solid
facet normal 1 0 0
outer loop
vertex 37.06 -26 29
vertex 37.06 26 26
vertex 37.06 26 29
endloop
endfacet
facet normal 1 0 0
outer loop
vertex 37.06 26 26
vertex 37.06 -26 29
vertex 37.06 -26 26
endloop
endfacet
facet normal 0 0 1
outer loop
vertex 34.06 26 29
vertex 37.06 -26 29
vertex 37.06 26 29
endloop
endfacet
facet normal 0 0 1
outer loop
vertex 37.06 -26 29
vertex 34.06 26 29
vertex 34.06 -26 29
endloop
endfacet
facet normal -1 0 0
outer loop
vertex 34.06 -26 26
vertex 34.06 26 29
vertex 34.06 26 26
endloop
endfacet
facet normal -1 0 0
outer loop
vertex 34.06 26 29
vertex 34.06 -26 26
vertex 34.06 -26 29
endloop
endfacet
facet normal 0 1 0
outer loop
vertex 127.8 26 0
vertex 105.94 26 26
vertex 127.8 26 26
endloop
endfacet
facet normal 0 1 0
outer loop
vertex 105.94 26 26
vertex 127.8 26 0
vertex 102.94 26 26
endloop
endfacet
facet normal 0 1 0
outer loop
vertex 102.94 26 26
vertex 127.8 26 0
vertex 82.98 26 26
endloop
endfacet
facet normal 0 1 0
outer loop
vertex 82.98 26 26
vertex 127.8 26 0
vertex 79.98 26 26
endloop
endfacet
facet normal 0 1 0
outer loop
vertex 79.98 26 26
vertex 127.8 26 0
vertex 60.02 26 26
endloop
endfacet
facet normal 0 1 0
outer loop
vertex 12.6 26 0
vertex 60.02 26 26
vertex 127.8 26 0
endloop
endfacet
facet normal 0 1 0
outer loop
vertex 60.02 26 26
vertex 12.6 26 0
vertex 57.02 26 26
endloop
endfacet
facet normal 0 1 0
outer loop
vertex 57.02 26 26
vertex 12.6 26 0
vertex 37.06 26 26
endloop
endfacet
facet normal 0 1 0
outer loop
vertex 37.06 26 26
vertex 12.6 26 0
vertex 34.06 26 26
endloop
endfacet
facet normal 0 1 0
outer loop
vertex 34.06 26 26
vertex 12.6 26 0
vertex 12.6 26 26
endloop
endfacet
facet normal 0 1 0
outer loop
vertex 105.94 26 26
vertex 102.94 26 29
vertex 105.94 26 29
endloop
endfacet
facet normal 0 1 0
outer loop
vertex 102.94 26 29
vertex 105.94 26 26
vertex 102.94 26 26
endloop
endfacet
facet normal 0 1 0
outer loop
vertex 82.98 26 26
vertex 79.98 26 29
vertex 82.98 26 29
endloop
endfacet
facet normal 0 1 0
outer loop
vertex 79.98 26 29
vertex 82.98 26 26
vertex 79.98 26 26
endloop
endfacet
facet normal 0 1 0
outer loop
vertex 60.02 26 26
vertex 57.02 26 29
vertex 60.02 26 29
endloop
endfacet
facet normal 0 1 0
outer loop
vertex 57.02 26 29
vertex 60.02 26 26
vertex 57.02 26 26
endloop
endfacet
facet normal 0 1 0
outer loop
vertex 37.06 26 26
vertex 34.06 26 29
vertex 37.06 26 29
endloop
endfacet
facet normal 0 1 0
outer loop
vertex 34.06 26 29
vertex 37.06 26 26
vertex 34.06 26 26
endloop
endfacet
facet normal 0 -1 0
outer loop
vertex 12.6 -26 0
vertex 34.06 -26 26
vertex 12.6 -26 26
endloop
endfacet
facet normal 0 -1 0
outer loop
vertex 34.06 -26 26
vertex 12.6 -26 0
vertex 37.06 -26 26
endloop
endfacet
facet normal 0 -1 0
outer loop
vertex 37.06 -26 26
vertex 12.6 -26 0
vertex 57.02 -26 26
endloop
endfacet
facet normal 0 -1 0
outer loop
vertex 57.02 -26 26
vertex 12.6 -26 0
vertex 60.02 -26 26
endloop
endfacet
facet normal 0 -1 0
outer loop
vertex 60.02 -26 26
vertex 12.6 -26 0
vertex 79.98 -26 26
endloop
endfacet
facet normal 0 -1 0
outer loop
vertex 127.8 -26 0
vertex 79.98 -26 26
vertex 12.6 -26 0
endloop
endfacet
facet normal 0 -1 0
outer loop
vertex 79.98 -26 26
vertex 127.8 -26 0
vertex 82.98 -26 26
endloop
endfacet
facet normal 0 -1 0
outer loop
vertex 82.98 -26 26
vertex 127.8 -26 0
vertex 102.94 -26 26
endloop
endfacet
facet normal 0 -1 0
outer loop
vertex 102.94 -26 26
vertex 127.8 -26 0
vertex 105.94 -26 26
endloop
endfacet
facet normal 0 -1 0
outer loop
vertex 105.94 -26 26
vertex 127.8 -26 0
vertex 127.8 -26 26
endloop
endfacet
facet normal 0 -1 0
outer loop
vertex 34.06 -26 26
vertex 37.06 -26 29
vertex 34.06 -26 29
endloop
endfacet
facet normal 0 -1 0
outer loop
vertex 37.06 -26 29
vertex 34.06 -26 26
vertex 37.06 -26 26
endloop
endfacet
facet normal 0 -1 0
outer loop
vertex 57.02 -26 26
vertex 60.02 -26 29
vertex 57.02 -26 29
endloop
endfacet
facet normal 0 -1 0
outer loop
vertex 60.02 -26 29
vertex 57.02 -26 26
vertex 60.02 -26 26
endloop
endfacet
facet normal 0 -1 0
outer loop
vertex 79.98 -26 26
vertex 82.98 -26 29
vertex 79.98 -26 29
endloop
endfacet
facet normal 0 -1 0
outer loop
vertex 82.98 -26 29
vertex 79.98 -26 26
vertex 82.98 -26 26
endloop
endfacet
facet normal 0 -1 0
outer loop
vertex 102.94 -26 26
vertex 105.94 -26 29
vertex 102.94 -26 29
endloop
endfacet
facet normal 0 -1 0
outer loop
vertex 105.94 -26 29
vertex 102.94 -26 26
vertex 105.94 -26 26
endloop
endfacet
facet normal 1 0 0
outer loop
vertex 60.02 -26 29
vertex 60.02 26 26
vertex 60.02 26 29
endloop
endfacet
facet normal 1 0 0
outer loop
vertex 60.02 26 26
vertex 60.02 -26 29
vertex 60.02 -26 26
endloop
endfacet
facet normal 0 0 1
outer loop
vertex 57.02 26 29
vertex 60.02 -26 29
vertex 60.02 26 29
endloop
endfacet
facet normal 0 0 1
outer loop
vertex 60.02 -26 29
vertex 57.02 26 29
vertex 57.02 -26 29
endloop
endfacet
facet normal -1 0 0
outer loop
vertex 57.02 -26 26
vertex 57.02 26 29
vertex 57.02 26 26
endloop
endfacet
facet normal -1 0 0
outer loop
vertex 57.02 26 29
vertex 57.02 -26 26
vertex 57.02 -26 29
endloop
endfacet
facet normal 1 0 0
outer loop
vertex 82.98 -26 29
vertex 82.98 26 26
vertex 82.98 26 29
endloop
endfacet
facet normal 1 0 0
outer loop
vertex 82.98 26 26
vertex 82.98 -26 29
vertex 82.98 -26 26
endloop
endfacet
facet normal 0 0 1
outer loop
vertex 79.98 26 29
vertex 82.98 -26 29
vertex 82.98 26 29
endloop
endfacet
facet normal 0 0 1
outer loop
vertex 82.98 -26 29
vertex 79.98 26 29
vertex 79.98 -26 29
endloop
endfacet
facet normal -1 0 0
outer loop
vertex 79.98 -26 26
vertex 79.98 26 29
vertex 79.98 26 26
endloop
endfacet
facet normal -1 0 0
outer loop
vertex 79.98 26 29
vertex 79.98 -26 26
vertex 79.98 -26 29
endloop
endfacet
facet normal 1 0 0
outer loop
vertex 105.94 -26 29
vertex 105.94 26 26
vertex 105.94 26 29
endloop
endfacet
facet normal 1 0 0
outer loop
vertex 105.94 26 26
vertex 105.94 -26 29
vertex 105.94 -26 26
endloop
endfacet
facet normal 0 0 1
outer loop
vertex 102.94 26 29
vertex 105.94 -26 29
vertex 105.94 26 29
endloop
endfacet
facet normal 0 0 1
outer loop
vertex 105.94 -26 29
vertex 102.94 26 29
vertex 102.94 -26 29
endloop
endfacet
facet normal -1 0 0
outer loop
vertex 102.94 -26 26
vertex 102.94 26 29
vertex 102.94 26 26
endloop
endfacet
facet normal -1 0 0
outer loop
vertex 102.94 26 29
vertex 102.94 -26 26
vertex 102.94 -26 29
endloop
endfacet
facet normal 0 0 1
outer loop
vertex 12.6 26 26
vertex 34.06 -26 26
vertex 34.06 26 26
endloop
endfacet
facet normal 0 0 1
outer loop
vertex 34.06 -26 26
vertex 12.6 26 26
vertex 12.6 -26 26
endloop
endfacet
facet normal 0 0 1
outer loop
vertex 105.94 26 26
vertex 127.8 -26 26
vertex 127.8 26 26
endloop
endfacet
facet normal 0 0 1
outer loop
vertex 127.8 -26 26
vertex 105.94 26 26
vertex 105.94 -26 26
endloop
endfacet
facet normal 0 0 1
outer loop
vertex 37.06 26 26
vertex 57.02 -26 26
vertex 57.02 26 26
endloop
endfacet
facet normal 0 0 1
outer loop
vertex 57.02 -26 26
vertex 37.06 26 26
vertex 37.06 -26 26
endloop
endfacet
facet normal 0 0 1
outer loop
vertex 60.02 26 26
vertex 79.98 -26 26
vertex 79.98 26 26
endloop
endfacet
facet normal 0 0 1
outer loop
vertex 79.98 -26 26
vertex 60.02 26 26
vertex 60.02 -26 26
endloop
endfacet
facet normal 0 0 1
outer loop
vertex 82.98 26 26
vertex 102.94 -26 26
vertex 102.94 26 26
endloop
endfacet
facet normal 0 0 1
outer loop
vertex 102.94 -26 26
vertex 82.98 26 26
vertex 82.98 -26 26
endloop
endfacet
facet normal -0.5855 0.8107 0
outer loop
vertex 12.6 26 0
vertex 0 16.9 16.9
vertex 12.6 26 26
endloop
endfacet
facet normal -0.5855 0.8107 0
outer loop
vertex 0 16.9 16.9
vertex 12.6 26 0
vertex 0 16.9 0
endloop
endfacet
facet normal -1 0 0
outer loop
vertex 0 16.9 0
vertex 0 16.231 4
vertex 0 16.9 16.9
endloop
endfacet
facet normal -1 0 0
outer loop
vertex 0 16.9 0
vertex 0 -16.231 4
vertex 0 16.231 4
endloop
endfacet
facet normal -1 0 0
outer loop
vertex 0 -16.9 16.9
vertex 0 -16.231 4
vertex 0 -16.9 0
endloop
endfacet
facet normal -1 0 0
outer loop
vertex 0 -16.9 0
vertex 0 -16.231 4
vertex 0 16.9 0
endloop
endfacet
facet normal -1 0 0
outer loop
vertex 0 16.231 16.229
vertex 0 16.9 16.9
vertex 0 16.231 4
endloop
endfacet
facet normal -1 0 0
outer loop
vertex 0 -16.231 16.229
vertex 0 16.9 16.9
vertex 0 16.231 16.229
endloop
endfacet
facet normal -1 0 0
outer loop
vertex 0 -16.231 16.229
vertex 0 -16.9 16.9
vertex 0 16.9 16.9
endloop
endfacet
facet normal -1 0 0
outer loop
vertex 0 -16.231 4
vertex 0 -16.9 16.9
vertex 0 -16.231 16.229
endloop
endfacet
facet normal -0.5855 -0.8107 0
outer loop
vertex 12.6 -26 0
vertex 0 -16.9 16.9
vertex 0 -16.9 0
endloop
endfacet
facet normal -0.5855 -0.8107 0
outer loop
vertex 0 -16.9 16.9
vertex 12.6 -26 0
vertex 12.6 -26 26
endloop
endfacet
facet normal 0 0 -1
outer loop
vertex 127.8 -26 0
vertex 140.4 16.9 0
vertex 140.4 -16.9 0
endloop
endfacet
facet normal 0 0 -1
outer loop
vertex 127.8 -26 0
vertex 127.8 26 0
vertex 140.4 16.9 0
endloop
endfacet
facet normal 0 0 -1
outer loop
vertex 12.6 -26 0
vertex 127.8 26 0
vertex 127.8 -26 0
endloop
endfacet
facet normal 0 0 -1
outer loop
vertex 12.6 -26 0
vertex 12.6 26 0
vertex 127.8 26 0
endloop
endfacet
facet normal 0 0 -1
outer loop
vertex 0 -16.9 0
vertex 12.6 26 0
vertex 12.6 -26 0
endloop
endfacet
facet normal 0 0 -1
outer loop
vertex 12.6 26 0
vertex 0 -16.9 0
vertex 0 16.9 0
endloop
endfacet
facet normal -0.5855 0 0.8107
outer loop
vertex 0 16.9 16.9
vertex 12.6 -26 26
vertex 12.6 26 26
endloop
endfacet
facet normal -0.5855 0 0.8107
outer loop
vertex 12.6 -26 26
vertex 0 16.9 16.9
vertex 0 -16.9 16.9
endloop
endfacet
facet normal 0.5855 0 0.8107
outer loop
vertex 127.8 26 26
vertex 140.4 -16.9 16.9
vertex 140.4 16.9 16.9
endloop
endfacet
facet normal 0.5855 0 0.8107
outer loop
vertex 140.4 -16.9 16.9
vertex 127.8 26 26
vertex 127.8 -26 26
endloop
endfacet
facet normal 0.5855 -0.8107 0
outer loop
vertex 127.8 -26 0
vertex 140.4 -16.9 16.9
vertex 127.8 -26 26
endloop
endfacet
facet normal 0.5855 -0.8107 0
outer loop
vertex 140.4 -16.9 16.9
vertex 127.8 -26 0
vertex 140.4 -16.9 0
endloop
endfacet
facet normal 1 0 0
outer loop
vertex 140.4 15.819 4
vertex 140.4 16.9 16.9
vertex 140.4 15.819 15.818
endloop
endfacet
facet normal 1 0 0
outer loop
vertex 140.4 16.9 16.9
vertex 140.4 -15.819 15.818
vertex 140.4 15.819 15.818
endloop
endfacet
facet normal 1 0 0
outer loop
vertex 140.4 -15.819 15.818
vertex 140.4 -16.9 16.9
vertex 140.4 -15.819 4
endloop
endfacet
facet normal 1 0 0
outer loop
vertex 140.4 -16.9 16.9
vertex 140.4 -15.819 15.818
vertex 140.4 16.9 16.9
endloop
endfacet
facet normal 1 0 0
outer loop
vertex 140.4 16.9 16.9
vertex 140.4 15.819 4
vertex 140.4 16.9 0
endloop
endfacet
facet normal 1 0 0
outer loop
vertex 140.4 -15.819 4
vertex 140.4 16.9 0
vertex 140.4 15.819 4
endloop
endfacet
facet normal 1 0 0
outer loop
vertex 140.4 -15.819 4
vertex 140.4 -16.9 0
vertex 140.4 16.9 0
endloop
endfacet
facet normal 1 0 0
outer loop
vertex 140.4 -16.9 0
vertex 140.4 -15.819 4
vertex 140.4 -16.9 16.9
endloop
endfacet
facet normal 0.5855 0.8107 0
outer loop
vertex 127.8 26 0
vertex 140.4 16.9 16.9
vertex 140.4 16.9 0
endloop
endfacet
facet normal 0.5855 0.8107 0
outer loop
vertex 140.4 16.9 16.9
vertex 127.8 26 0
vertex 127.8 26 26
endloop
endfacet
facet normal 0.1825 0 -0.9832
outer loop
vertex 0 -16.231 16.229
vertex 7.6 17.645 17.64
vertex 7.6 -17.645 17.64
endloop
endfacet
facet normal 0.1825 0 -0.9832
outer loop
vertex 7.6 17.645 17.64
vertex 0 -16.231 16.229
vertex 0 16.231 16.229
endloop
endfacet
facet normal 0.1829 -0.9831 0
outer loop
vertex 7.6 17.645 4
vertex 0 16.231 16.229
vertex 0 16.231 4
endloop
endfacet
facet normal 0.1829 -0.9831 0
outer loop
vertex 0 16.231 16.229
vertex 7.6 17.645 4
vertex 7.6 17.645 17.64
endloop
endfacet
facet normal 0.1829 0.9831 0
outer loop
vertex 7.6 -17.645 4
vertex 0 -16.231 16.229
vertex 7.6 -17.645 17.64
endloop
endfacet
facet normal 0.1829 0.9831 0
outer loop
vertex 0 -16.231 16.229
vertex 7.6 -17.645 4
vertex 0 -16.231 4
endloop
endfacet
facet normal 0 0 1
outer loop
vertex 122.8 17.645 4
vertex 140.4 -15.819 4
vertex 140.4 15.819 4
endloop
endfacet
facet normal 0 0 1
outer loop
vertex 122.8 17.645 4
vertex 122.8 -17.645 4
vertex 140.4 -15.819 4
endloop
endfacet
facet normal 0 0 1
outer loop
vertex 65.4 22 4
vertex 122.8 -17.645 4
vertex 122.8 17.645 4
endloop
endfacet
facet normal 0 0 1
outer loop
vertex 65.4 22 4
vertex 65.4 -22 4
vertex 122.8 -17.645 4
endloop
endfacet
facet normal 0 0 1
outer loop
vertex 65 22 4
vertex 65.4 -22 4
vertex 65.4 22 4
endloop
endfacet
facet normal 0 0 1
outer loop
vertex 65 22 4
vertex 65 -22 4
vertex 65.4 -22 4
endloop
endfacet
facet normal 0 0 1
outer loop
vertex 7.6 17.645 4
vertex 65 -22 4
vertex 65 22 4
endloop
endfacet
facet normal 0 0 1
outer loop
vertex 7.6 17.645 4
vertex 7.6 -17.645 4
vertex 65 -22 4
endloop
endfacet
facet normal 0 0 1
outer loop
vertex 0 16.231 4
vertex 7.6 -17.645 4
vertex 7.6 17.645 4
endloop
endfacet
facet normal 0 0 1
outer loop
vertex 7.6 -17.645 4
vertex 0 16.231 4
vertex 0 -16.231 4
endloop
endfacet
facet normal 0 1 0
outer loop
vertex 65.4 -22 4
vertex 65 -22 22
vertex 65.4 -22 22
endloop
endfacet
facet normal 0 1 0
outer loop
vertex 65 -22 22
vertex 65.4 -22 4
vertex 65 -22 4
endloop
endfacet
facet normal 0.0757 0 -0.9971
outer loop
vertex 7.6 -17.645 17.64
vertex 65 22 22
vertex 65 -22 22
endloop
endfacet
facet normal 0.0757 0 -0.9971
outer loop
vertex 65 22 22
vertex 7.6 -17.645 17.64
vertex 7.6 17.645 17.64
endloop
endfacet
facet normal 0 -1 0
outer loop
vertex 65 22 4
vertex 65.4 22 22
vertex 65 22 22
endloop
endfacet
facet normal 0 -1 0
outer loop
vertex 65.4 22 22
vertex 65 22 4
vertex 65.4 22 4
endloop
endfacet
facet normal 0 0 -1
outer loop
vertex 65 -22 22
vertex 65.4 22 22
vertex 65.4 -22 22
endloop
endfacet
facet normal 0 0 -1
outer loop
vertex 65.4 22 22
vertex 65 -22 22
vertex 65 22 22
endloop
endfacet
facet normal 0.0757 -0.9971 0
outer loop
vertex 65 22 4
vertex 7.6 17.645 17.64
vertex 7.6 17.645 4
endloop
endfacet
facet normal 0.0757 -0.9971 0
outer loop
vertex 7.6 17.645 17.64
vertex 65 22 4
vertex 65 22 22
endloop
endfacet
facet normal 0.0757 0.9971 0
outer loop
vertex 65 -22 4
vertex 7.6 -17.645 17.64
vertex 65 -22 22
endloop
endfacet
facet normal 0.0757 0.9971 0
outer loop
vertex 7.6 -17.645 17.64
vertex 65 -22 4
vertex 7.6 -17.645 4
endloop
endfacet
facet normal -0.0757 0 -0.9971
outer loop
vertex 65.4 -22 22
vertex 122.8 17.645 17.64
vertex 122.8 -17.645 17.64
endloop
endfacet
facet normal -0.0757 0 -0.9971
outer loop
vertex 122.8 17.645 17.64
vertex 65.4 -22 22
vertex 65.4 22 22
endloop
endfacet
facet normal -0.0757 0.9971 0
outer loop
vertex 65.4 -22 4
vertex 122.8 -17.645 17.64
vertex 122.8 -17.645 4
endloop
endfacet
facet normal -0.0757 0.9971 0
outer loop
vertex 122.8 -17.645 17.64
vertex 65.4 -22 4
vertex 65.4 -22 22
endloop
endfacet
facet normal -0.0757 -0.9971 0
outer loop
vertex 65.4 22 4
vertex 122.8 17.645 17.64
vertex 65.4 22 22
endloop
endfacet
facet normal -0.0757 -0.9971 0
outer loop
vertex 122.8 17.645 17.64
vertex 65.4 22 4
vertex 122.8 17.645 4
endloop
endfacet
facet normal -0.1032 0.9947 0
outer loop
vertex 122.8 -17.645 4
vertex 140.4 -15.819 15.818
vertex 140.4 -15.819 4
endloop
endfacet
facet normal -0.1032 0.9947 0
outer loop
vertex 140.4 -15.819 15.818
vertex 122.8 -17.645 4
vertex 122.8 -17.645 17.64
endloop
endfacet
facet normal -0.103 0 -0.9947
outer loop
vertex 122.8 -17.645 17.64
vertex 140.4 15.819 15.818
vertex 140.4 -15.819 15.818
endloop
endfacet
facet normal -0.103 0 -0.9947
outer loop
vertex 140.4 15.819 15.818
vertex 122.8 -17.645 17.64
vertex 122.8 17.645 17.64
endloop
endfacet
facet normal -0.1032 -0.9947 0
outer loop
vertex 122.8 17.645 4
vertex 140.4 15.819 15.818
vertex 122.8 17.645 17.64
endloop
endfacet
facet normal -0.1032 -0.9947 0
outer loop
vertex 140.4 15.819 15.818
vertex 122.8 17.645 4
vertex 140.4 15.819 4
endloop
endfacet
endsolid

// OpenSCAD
$fn = 32;

// ----------------------------------------------------------------------
// Faired channel: 140 x 52 x 26 mm, 4 mm walls, faired ends
// ----------------------------------------------------------------------

// --- parameters (mm) ---
length = 140;             // channel length
width = 52;               // channel width at mid length
height = 26;              // channel height at mid length
wall = 4;                 // side wall thickness
floor_t = 4;              // floor thickness
end_w = 33.8;             // faired end width
end_h = 16.9;             // faired end height
ribs = 4;                 // stiffening ribs on the top
rib_t = 3;                // rib thickness
rib_h = 3;                // rib height

difference() {
  union() {
    hull() {
      translate([0, -16.9, 0]) cube([0.4, 33.8, 16.9]);
      translate([12.6, -26, 0]) cube([0.4, 52, 26]);
    }
    hull() {
      translate([12.6, -26, 0]) cube([0.4, 52, 26]);
      translate([70, -26, 0]) cube([0.4, 52, 26]);
    }
    hull() {
      translate([70, -26, 0]) cube([0.4, 52, 26]);
      translate([127.4, -26, 0]) cube([0.4, 52, 26]);
    }
    hull() {
      translate([127.4, -26, 0]) cube([0.4, 52, 26]);
      translate([140, -16.9, 0]) cube([0.4, 33.8, 16.9]);
    }
    /* stiffening ribs across the flat top, sunk 0.8 mm into it */
    for (i = [1 : ribs]) {
      translate([12.6 + i * (length - 2 * 12.6) / (ribs + 1) - rib_t / 2, -width / 2, height - 0.8]) cube([rib_t, width, rib_h + 0.8]);
    }
  }
  /* cavity, 5 mm proud of both ends so the ports are cut clean */
  hull() {
    translate([-5, -15.3, 4]) cube([0.4, 30.6, 11.3]);
    translate([7.6, -17.645, 4]) cube([0.4, 35.29, 13.64]);
  }
  hull() {
    translate([7.6, -17.645, 4]) cube([0.4, 35.29, 13.64]);
    translate([65, -22, 4]) cube([0.4, 44, 18]);
  }
  hull() {
    translate([65, -22, 4]) cube([0.4, 44, 18]);
    translate([122.4, -17.645, 4]) cube([0.4, 35.29, 13.64]);
  }
  hull() {
    translate([122.4, -17.645, 4]) cube([0.4, 35.29, 13.64]);
    translate([145, -15.3, 4]) cube([0.4, 30.6, 11.3]);
  }
}
